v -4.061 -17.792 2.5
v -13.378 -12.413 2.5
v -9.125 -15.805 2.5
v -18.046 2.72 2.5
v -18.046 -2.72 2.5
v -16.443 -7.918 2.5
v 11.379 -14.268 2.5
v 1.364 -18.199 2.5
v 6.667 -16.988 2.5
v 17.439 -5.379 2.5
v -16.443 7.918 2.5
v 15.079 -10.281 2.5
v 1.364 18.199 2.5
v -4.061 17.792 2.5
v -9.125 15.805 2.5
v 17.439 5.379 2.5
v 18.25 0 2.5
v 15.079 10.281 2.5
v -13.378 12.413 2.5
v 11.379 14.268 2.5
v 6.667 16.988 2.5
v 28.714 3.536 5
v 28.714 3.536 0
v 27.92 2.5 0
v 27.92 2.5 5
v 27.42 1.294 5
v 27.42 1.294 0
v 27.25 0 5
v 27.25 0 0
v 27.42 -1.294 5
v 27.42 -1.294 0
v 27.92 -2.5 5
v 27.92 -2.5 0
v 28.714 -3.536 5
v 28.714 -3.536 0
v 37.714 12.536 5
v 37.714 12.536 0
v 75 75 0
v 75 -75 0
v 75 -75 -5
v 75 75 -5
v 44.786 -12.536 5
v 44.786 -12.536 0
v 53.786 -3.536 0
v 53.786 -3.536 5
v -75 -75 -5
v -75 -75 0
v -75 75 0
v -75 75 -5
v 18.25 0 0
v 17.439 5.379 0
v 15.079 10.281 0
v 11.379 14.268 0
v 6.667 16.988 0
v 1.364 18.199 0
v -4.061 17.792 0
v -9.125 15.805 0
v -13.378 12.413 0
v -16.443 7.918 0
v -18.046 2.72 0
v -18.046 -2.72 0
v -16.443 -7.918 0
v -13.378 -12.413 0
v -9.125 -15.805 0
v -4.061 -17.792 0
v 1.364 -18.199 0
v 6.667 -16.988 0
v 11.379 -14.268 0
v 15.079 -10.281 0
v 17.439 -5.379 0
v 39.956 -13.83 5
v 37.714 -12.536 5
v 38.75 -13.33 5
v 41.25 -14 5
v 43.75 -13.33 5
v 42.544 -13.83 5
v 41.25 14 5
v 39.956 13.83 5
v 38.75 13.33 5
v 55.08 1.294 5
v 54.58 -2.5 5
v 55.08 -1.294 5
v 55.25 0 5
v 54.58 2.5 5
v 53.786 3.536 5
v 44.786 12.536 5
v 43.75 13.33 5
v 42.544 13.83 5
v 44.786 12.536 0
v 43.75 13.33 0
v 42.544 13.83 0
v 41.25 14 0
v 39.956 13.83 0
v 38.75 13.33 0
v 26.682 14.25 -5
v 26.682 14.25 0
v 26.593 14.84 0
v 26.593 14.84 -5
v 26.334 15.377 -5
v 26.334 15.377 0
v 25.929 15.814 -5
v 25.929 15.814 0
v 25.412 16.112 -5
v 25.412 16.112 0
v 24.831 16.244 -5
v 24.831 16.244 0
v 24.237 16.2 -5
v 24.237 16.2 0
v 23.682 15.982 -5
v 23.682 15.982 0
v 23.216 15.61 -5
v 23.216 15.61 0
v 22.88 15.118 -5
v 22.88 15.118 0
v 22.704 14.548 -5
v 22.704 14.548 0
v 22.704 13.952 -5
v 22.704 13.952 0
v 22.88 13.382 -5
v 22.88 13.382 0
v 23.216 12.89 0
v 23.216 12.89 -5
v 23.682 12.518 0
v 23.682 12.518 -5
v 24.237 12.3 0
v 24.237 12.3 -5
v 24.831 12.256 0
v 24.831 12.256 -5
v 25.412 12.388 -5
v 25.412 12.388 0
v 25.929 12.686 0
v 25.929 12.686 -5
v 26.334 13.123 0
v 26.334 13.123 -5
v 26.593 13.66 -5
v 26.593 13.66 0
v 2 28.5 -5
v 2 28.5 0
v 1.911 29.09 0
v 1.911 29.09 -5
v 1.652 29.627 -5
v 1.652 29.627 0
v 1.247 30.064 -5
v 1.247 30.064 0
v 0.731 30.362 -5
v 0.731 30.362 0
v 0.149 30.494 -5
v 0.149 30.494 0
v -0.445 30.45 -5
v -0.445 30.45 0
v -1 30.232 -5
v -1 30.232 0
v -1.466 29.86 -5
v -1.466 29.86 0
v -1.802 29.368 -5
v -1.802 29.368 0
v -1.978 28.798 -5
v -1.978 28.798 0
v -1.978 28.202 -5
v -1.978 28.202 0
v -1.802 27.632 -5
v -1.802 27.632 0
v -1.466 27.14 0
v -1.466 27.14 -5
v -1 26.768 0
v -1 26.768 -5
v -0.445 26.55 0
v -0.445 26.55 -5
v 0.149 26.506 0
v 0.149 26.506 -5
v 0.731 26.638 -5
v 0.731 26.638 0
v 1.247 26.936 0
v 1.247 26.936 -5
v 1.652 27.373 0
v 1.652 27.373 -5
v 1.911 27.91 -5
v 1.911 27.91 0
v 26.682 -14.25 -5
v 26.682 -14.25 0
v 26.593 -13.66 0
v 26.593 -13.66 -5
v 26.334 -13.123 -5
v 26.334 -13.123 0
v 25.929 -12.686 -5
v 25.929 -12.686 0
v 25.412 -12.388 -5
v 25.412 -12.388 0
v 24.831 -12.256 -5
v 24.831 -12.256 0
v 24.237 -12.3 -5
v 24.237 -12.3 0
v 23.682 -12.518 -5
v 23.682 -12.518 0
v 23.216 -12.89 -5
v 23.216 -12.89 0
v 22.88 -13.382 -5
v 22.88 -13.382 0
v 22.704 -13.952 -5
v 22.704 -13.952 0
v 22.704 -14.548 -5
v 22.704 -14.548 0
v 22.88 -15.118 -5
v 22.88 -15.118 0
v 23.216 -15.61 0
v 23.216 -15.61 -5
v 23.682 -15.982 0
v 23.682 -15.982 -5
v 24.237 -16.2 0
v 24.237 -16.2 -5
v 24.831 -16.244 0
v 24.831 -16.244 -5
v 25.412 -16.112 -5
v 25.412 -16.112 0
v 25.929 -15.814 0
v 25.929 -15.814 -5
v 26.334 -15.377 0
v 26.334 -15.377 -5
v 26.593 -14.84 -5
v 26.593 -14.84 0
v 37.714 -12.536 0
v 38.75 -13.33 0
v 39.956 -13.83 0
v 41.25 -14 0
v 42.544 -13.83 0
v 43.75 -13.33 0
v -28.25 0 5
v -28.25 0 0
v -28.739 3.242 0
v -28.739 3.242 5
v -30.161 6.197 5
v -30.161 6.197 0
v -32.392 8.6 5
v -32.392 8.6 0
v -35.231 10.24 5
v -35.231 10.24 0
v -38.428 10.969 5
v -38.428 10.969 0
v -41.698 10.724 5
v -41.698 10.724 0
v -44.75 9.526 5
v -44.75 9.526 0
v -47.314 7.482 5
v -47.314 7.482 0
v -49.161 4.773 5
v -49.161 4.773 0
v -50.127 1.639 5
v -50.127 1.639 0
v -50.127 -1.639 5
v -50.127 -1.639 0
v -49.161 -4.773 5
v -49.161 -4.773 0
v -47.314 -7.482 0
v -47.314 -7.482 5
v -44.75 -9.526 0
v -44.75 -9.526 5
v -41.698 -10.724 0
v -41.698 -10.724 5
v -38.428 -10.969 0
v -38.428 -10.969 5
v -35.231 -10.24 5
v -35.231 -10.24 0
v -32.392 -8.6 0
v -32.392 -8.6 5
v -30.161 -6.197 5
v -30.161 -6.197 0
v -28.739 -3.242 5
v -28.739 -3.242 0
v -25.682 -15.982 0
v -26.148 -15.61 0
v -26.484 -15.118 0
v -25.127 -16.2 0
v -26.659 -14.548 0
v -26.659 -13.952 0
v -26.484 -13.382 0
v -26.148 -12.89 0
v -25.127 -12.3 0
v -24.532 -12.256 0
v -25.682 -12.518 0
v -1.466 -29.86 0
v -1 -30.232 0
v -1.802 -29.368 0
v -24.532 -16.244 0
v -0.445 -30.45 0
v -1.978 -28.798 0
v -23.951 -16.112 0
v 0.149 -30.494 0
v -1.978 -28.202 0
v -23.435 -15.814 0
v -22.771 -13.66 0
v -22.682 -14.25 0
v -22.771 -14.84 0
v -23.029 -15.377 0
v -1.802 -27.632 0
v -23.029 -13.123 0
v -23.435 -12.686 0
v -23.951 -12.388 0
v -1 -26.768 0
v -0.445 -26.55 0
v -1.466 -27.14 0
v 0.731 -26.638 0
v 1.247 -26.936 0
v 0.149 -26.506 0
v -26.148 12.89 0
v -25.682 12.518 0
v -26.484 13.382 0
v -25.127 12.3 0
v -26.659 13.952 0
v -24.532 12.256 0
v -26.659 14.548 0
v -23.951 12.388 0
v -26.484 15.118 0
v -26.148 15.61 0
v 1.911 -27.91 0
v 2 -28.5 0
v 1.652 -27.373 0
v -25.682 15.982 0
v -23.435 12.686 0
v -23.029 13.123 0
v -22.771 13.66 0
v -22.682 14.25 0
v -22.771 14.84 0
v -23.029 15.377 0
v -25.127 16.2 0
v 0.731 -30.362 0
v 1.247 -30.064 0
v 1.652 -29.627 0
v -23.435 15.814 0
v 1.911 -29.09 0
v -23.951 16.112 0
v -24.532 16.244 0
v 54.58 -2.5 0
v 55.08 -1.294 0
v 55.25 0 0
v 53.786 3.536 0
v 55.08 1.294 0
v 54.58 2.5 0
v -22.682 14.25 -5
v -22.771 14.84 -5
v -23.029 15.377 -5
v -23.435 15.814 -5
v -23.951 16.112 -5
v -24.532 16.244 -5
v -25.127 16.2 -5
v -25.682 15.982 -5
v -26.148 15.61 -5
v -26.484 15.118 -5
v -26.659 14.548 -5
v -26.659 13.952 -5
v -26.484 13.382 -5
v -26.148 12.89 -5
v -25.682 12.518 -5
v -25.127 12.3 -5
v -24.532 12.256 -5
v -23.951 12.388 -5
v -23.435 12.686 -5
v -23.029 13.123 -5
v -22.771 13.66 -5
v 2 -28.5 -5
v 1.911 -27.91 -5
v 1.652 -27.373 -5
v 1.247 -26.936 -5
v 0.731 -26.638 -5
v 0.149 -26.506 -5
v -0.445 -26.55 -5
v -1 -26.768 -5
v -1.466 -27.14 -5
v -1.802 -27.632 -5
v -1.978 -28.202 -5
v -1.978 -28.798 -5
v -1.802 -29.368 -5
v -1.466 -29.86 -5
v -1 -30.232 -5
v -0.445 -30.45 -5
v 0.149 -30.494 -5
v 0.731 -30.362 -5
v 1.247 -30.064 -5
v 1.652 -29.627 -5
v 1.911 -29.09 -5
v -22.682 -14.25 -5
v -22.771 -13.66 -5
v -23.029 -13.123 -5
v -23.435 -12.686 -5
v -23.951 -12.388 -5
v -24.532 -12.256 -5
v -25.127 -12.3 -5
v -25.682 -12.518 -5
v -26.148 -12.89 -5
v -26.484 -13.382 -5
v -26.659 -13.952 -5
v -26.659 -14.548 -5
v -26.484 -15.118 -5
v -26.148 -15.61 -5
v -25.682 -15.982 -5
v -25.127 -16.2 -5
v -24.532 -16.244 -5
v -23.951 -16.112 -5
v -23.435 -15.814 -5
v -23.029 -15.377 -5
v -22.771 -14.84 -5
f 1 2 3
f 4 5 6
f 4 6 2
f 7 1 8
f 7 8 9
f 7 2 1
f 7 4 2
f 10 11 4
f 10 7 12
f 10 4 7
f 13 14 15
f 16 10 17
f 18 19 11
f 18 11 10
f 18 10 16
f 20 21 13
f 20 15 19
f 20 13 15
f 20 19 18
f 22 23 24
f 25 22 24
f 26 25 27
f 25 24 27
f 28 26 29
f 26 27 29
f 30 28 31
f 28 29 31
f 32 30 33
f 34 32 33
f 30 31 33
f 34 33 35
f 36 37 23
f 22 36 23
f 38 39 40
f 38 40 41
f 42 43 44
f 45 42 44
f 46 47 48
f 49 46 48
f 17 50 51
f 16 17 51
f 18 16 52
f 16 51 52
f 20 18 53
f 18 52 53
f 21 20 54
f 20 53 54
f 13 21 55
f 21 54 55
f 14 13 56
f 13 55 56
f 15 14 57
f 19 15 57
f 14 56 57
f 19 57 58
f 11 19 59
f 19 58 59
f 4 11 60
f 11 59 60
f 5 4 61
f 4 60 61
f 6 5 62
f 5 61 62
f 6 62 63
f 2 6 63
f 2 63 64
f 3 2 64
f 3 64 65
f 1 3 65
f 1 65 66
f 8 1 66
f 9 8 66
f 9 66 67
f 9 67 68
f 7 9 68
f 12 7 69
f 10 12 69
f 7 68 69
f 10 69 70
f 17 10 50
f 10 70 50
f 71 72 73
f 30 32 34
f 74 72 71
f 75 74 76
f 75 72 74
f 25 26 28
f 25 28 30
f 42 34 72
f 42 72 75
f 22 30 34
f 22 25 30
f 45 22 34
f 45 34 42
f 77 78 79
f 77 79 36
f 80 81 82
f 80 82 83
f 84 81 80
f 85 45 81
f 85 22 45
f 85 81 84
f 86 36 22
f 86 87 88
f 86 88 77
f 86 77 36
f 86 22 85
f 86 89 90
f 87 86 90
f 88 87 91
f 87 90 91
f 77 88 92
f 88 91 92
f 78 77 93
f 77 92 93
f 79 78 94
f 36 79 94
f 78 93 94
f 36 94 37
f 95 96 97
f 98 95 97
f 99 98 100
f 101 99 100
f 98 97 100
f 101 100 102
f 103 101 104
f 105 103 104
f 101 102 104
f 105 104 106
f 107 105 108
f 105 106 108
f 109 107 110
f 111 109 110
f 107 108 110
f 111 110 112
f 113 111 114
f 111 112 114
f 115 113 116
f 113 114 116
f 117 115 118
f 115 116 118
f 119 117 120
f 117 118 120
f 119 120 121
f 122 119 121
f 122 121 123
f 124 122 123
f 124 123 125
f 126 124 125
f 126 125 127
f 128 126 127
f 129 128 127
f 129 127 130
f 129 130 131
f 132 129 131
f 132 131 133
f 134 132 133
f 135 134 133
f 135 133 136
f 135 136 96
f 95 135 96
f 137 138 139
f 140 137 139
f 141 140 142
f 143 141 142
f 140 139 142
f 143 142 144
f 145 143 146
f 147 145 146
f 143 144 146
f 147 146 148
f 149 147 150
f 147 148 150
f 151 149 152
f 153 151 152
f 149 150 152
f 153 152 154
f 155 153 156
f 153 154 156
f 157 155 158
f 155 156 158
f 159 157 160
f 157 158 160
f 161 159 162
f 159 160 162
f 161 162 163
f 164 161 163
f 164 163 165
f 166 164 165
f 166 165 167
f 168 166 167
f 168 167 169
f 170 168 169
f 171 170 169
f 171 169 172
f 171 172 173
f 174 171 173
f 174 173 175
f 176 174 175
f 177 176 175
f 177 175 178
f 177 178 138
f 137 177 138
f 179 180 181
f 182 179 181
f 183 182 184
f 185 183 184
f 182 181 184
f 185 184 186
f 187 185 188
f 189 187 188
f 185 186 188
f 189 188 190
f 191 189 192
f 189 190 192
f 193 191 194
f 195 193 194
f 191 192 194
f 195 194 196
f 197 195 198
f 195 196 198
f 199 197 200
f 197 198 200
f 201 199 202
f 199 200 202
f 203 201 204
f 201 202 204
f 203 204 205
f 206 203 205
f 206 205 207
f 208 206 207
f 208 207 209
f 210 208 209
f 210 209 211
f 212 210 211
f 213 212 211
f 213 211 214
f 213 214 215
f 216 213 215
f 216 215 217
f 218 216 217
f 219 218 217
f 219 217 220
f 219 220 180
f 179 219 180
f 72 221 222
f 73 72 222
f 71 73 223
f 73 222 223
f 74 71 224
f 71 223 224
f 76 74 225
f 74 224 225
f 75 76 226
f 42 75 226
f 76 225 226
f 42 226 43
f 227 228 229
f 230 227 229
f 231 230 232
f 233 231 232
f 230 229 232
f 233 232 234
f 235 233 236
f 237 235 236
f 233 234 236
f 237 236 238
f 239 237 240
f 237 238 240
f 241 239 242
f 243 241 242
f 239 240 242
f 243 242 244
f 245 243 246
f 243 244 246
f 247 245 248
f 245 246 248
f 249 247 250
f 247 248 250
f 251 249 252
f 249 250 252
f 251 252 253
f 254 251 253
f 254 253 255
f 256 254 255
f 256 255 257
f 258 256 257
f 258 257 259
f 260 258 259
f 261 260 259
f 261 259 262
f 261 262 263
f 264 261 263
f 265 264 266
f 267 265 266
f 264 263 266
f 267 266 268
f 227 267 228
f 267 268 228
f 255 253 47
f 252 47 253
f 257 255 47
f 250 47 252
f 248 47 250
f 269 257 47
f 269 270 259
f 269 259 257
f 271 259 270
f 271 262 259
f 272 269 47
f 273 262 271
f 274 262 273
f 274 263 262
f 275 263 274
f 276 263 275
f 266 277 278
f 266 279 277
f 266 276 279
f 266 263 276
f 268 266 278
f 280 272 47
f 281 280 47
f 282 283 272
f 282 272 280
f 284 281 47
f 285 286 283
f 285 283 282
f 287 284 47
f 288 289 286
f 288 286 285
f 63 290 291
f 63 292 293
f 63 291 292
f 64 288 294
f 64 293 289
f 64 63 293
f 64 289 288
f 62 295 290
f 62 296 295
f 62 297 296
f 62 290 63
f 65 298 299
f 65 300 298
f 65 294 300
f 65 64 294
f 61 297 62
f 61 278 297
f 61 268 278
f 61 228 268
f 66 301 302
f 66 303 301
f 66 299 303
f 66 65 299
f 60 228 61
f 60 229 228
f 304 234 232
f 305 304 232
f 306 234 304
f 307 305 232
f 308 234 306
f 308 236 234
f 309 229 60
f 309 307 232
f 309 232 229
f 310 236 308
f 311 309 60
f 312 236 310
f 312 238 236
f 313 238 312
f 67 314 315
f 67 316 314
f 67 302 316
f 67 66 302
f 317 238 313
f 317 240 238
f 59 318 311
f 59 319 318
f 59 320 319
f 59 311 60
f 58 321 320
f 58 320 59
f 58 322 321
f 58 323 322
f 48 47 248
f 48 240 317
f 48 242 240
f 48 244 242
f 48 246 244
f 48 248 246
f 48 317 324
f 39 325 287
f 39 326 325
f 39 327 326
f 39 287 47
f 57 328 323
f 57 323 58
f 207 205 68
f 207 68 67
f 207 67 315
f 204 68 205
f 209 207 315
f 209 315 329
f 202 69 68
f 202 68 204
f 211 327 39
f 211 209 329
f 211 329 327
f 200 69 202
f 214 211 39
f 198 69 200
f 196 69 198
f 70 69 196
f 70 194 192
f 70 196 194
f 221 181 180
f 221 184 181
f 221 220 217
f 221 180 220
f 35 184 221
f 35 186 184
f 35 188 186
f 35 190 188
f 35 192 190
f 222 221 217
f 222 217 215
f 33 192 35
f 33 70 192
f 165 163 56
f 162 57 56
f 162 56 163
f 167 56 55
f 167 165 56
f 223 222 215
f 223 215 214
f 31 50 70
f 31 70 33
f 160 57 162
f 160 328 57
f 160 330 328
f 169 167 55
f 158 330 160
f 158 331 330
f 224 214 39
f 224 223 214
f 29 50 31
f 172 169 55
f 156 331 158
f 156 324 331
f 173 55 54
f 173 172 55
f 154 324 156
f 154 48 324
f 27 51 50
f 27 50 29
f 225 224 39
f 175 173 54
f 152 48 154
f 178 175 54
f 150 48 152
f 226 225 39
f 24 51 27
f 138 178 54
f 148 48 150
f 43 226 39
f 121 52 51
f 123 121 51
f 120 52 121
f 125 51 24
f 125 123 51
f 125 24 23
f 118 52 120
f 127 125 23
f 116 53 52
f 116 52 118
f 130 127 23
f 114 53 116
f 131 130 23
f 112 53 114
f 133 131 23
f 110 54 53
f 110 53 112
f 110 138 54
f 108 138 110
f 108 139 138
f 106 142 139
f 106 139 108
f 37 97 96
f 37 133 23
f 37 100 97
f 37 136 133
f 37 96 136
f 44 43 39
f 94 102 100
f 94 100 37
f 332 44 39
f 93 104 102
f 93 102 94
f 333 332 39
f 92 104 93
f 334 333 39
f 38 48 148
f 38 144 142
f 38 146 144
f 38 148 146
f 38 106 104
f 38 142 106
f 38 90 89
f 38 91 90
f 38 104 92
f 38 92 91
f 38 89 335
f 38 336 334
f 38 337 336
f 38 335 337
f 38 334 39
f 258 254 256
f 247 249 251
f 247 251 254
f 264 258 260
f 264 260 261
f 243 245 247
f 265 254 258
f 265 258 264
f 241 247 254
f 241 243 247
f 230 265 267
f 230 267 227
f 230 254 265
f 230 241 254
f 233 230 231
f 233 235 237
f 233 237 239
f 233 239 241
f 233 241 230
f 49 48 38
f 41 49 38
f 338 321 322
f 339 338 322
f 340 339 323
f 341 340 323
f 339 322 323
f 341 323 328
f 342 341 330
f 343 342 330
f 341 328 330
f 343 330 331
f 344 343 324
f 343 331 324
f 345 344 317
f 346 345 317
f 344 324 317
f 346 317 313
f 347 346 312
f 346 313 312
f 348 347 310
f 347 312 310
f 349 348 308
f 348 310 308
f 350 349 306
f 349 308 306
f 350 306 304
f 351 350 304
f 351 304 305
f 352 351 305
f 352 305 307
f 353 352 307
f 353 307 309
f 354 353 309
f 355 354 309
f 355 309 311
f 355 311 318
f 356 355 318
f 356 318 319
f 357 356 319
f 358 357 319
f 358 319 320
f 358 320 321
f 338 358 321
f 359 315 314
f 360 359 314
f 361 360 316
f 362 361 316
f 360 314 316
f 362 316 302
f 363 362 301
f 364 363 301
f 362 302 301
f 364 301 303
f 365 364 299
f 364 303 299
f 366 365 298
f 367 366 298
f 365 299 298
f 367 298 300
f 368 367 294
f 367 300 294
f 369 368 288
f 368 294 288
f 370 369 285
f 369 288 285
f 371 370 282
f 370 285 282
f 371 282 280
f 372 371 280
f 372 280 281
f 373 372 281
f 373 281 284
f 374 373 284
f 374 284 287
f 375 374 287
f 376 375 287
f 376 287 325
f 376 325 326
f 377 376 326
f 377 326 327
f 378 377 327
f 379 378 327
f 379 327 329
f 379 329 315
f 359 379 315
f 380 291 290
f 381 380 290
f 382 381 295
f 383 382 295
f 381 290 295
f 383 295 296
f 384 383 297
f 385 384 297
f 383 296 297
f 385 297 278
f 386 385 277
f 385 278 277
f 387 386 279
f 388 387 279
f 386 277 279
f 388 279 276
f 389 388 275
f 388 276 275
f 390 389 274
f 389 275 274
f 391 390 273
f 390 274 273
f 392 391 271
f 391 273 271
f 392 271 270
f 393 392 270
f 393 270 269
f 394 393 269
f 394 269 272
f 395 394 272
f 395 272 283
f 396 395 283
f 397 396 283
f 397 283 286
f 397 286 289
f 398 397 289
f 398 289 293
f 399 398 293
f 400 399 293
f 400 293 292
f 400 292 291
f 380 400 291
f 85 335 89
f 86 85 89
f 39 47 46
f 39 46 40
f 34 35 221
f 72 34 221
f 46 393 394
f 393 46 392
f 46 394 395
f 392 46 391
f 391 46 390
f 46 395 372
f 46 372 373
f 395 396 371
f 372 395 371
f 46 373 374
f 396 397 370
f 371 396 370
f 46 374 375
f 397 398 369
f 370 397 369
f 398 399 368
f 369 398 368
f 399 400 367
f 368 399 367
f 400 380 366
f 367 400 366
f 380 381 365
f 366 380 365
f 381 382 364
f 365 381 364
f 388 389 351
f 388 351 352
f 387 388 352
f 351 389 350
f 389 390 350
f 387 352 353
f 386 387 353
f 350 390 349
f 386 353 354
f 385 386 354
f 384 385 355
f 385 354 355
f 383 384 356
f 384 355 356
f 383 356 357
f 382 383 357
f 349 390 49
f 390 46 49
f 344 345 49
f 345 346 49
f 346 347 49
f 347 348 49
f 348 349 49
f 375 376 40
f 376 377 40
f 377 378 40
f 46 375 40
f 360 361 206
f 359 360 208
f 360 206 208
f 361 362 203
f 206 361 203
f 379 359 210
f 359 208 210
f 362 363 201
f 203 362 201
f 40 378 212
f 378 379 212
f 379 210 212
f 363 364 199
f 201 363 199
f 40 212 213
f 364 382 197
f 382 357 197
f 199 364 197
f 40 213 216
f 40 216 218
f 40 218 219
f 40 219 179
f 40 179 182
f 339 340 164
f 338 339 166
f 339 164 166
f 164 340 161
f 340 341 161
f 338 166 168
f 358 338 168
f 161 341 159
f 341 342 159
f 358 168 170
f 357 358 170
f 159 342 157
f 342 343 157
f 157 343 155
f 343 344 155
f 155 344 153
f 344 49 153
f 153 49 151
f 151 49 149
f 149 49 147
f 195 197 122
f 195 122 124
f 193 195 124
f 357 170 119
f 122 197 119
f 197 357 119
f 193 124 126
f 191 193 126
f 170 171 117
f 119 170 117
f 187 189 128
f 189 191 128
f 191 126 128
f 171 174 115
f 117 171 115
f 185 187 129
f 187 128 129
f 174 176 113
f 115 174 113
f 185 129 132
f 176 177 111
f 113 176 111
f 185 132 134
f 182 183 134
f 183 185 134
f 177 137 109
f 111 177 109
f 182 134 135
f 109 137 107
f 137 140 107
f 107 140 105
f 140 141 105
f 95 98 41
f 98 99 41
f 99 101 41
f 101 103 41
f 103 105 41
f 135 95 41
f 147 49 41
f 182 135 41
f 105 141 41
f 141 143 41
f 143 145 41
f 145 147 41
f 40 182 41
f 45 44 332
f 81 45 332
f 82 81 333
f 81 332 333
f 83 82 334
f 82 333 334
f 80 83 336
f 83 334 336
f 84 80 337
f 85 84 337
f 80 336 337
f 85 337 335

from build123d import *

# Parameters (mm, degrees)
F0_W     = 150
F0_H     = 150
F1_DEPTH = 5
F2_R     = 18.25
F3_DEPTH = 2.5
F4_R     = 11
F5_DEPTH = 5
F6_R     = 2
F7_DEPTH = 5.001


with BuildPart() as f1:
    # F0 (on Top) → F1 (new body)
    with BuildSketch(Plane.XY):
        Rectangle(F0_W, F0_H)
    extrude(amount=-F1_DEPTH)

    # F2 (on face) → F3 (join)
    with BuildSketch(Plane.XY):
        Circle(F2_R)
    extrude(amount=F3_DEPTH)

    # F4 (on face) → F5 (join)
    with BuildSketch(Plane.XY):
        with Locations((-39.25, 0)):
            Circle(F4_R)
        with BuildLine():
            Line((37.714466, 12.535534), (28.714466, 3.535534))
            ThreePointArc((28.714466, 3.535534), (27.25, 0), (28.714466, -3.535534))
            Line((28.714466, -3.535534), (37.714466, -12.535534))
            ThreePointArc((37.714466, -12.535534), (41.25, -14), (44.785534, -12.535534))
            Line((44.785534, -12.535534), (53.785534, -3.535534))
            ThreePointArc((53.785534, -3.535534), (55.25, 0), (53.785534, 3.535534))
            Line((53.785534, 3.535534), (44.785534, 12.535534))
            ThreePointArc((44.785534, 12.535534), (41.25, 14), (37.714466, 12.535534))
        make_face()
    extrude(amount=F5_DEPTH)

    # F6 (on face) → F7 (cut, through all)
    with BuildSketch(Plane.XY):
        with Locations((0, 28.5)):
            Circle(F6_R)
        with Locations((-24.681724, 14.25)):
            Circle(F6_R)
        with Locations((-24.681724, -14.25)):
            Circle(F6_R)
        with Locations((0, -28.5)):
            Circle(F6_R)
        with Locations((24.681724, -14.25)):
            Circle(F6_R)
        with Locations((24.681724, 14.25)):
            Circle(F6_R)
    extrude(amount=-F7_DEPTH, mode=Mode.SUBTRACT)


solid = f1.part
